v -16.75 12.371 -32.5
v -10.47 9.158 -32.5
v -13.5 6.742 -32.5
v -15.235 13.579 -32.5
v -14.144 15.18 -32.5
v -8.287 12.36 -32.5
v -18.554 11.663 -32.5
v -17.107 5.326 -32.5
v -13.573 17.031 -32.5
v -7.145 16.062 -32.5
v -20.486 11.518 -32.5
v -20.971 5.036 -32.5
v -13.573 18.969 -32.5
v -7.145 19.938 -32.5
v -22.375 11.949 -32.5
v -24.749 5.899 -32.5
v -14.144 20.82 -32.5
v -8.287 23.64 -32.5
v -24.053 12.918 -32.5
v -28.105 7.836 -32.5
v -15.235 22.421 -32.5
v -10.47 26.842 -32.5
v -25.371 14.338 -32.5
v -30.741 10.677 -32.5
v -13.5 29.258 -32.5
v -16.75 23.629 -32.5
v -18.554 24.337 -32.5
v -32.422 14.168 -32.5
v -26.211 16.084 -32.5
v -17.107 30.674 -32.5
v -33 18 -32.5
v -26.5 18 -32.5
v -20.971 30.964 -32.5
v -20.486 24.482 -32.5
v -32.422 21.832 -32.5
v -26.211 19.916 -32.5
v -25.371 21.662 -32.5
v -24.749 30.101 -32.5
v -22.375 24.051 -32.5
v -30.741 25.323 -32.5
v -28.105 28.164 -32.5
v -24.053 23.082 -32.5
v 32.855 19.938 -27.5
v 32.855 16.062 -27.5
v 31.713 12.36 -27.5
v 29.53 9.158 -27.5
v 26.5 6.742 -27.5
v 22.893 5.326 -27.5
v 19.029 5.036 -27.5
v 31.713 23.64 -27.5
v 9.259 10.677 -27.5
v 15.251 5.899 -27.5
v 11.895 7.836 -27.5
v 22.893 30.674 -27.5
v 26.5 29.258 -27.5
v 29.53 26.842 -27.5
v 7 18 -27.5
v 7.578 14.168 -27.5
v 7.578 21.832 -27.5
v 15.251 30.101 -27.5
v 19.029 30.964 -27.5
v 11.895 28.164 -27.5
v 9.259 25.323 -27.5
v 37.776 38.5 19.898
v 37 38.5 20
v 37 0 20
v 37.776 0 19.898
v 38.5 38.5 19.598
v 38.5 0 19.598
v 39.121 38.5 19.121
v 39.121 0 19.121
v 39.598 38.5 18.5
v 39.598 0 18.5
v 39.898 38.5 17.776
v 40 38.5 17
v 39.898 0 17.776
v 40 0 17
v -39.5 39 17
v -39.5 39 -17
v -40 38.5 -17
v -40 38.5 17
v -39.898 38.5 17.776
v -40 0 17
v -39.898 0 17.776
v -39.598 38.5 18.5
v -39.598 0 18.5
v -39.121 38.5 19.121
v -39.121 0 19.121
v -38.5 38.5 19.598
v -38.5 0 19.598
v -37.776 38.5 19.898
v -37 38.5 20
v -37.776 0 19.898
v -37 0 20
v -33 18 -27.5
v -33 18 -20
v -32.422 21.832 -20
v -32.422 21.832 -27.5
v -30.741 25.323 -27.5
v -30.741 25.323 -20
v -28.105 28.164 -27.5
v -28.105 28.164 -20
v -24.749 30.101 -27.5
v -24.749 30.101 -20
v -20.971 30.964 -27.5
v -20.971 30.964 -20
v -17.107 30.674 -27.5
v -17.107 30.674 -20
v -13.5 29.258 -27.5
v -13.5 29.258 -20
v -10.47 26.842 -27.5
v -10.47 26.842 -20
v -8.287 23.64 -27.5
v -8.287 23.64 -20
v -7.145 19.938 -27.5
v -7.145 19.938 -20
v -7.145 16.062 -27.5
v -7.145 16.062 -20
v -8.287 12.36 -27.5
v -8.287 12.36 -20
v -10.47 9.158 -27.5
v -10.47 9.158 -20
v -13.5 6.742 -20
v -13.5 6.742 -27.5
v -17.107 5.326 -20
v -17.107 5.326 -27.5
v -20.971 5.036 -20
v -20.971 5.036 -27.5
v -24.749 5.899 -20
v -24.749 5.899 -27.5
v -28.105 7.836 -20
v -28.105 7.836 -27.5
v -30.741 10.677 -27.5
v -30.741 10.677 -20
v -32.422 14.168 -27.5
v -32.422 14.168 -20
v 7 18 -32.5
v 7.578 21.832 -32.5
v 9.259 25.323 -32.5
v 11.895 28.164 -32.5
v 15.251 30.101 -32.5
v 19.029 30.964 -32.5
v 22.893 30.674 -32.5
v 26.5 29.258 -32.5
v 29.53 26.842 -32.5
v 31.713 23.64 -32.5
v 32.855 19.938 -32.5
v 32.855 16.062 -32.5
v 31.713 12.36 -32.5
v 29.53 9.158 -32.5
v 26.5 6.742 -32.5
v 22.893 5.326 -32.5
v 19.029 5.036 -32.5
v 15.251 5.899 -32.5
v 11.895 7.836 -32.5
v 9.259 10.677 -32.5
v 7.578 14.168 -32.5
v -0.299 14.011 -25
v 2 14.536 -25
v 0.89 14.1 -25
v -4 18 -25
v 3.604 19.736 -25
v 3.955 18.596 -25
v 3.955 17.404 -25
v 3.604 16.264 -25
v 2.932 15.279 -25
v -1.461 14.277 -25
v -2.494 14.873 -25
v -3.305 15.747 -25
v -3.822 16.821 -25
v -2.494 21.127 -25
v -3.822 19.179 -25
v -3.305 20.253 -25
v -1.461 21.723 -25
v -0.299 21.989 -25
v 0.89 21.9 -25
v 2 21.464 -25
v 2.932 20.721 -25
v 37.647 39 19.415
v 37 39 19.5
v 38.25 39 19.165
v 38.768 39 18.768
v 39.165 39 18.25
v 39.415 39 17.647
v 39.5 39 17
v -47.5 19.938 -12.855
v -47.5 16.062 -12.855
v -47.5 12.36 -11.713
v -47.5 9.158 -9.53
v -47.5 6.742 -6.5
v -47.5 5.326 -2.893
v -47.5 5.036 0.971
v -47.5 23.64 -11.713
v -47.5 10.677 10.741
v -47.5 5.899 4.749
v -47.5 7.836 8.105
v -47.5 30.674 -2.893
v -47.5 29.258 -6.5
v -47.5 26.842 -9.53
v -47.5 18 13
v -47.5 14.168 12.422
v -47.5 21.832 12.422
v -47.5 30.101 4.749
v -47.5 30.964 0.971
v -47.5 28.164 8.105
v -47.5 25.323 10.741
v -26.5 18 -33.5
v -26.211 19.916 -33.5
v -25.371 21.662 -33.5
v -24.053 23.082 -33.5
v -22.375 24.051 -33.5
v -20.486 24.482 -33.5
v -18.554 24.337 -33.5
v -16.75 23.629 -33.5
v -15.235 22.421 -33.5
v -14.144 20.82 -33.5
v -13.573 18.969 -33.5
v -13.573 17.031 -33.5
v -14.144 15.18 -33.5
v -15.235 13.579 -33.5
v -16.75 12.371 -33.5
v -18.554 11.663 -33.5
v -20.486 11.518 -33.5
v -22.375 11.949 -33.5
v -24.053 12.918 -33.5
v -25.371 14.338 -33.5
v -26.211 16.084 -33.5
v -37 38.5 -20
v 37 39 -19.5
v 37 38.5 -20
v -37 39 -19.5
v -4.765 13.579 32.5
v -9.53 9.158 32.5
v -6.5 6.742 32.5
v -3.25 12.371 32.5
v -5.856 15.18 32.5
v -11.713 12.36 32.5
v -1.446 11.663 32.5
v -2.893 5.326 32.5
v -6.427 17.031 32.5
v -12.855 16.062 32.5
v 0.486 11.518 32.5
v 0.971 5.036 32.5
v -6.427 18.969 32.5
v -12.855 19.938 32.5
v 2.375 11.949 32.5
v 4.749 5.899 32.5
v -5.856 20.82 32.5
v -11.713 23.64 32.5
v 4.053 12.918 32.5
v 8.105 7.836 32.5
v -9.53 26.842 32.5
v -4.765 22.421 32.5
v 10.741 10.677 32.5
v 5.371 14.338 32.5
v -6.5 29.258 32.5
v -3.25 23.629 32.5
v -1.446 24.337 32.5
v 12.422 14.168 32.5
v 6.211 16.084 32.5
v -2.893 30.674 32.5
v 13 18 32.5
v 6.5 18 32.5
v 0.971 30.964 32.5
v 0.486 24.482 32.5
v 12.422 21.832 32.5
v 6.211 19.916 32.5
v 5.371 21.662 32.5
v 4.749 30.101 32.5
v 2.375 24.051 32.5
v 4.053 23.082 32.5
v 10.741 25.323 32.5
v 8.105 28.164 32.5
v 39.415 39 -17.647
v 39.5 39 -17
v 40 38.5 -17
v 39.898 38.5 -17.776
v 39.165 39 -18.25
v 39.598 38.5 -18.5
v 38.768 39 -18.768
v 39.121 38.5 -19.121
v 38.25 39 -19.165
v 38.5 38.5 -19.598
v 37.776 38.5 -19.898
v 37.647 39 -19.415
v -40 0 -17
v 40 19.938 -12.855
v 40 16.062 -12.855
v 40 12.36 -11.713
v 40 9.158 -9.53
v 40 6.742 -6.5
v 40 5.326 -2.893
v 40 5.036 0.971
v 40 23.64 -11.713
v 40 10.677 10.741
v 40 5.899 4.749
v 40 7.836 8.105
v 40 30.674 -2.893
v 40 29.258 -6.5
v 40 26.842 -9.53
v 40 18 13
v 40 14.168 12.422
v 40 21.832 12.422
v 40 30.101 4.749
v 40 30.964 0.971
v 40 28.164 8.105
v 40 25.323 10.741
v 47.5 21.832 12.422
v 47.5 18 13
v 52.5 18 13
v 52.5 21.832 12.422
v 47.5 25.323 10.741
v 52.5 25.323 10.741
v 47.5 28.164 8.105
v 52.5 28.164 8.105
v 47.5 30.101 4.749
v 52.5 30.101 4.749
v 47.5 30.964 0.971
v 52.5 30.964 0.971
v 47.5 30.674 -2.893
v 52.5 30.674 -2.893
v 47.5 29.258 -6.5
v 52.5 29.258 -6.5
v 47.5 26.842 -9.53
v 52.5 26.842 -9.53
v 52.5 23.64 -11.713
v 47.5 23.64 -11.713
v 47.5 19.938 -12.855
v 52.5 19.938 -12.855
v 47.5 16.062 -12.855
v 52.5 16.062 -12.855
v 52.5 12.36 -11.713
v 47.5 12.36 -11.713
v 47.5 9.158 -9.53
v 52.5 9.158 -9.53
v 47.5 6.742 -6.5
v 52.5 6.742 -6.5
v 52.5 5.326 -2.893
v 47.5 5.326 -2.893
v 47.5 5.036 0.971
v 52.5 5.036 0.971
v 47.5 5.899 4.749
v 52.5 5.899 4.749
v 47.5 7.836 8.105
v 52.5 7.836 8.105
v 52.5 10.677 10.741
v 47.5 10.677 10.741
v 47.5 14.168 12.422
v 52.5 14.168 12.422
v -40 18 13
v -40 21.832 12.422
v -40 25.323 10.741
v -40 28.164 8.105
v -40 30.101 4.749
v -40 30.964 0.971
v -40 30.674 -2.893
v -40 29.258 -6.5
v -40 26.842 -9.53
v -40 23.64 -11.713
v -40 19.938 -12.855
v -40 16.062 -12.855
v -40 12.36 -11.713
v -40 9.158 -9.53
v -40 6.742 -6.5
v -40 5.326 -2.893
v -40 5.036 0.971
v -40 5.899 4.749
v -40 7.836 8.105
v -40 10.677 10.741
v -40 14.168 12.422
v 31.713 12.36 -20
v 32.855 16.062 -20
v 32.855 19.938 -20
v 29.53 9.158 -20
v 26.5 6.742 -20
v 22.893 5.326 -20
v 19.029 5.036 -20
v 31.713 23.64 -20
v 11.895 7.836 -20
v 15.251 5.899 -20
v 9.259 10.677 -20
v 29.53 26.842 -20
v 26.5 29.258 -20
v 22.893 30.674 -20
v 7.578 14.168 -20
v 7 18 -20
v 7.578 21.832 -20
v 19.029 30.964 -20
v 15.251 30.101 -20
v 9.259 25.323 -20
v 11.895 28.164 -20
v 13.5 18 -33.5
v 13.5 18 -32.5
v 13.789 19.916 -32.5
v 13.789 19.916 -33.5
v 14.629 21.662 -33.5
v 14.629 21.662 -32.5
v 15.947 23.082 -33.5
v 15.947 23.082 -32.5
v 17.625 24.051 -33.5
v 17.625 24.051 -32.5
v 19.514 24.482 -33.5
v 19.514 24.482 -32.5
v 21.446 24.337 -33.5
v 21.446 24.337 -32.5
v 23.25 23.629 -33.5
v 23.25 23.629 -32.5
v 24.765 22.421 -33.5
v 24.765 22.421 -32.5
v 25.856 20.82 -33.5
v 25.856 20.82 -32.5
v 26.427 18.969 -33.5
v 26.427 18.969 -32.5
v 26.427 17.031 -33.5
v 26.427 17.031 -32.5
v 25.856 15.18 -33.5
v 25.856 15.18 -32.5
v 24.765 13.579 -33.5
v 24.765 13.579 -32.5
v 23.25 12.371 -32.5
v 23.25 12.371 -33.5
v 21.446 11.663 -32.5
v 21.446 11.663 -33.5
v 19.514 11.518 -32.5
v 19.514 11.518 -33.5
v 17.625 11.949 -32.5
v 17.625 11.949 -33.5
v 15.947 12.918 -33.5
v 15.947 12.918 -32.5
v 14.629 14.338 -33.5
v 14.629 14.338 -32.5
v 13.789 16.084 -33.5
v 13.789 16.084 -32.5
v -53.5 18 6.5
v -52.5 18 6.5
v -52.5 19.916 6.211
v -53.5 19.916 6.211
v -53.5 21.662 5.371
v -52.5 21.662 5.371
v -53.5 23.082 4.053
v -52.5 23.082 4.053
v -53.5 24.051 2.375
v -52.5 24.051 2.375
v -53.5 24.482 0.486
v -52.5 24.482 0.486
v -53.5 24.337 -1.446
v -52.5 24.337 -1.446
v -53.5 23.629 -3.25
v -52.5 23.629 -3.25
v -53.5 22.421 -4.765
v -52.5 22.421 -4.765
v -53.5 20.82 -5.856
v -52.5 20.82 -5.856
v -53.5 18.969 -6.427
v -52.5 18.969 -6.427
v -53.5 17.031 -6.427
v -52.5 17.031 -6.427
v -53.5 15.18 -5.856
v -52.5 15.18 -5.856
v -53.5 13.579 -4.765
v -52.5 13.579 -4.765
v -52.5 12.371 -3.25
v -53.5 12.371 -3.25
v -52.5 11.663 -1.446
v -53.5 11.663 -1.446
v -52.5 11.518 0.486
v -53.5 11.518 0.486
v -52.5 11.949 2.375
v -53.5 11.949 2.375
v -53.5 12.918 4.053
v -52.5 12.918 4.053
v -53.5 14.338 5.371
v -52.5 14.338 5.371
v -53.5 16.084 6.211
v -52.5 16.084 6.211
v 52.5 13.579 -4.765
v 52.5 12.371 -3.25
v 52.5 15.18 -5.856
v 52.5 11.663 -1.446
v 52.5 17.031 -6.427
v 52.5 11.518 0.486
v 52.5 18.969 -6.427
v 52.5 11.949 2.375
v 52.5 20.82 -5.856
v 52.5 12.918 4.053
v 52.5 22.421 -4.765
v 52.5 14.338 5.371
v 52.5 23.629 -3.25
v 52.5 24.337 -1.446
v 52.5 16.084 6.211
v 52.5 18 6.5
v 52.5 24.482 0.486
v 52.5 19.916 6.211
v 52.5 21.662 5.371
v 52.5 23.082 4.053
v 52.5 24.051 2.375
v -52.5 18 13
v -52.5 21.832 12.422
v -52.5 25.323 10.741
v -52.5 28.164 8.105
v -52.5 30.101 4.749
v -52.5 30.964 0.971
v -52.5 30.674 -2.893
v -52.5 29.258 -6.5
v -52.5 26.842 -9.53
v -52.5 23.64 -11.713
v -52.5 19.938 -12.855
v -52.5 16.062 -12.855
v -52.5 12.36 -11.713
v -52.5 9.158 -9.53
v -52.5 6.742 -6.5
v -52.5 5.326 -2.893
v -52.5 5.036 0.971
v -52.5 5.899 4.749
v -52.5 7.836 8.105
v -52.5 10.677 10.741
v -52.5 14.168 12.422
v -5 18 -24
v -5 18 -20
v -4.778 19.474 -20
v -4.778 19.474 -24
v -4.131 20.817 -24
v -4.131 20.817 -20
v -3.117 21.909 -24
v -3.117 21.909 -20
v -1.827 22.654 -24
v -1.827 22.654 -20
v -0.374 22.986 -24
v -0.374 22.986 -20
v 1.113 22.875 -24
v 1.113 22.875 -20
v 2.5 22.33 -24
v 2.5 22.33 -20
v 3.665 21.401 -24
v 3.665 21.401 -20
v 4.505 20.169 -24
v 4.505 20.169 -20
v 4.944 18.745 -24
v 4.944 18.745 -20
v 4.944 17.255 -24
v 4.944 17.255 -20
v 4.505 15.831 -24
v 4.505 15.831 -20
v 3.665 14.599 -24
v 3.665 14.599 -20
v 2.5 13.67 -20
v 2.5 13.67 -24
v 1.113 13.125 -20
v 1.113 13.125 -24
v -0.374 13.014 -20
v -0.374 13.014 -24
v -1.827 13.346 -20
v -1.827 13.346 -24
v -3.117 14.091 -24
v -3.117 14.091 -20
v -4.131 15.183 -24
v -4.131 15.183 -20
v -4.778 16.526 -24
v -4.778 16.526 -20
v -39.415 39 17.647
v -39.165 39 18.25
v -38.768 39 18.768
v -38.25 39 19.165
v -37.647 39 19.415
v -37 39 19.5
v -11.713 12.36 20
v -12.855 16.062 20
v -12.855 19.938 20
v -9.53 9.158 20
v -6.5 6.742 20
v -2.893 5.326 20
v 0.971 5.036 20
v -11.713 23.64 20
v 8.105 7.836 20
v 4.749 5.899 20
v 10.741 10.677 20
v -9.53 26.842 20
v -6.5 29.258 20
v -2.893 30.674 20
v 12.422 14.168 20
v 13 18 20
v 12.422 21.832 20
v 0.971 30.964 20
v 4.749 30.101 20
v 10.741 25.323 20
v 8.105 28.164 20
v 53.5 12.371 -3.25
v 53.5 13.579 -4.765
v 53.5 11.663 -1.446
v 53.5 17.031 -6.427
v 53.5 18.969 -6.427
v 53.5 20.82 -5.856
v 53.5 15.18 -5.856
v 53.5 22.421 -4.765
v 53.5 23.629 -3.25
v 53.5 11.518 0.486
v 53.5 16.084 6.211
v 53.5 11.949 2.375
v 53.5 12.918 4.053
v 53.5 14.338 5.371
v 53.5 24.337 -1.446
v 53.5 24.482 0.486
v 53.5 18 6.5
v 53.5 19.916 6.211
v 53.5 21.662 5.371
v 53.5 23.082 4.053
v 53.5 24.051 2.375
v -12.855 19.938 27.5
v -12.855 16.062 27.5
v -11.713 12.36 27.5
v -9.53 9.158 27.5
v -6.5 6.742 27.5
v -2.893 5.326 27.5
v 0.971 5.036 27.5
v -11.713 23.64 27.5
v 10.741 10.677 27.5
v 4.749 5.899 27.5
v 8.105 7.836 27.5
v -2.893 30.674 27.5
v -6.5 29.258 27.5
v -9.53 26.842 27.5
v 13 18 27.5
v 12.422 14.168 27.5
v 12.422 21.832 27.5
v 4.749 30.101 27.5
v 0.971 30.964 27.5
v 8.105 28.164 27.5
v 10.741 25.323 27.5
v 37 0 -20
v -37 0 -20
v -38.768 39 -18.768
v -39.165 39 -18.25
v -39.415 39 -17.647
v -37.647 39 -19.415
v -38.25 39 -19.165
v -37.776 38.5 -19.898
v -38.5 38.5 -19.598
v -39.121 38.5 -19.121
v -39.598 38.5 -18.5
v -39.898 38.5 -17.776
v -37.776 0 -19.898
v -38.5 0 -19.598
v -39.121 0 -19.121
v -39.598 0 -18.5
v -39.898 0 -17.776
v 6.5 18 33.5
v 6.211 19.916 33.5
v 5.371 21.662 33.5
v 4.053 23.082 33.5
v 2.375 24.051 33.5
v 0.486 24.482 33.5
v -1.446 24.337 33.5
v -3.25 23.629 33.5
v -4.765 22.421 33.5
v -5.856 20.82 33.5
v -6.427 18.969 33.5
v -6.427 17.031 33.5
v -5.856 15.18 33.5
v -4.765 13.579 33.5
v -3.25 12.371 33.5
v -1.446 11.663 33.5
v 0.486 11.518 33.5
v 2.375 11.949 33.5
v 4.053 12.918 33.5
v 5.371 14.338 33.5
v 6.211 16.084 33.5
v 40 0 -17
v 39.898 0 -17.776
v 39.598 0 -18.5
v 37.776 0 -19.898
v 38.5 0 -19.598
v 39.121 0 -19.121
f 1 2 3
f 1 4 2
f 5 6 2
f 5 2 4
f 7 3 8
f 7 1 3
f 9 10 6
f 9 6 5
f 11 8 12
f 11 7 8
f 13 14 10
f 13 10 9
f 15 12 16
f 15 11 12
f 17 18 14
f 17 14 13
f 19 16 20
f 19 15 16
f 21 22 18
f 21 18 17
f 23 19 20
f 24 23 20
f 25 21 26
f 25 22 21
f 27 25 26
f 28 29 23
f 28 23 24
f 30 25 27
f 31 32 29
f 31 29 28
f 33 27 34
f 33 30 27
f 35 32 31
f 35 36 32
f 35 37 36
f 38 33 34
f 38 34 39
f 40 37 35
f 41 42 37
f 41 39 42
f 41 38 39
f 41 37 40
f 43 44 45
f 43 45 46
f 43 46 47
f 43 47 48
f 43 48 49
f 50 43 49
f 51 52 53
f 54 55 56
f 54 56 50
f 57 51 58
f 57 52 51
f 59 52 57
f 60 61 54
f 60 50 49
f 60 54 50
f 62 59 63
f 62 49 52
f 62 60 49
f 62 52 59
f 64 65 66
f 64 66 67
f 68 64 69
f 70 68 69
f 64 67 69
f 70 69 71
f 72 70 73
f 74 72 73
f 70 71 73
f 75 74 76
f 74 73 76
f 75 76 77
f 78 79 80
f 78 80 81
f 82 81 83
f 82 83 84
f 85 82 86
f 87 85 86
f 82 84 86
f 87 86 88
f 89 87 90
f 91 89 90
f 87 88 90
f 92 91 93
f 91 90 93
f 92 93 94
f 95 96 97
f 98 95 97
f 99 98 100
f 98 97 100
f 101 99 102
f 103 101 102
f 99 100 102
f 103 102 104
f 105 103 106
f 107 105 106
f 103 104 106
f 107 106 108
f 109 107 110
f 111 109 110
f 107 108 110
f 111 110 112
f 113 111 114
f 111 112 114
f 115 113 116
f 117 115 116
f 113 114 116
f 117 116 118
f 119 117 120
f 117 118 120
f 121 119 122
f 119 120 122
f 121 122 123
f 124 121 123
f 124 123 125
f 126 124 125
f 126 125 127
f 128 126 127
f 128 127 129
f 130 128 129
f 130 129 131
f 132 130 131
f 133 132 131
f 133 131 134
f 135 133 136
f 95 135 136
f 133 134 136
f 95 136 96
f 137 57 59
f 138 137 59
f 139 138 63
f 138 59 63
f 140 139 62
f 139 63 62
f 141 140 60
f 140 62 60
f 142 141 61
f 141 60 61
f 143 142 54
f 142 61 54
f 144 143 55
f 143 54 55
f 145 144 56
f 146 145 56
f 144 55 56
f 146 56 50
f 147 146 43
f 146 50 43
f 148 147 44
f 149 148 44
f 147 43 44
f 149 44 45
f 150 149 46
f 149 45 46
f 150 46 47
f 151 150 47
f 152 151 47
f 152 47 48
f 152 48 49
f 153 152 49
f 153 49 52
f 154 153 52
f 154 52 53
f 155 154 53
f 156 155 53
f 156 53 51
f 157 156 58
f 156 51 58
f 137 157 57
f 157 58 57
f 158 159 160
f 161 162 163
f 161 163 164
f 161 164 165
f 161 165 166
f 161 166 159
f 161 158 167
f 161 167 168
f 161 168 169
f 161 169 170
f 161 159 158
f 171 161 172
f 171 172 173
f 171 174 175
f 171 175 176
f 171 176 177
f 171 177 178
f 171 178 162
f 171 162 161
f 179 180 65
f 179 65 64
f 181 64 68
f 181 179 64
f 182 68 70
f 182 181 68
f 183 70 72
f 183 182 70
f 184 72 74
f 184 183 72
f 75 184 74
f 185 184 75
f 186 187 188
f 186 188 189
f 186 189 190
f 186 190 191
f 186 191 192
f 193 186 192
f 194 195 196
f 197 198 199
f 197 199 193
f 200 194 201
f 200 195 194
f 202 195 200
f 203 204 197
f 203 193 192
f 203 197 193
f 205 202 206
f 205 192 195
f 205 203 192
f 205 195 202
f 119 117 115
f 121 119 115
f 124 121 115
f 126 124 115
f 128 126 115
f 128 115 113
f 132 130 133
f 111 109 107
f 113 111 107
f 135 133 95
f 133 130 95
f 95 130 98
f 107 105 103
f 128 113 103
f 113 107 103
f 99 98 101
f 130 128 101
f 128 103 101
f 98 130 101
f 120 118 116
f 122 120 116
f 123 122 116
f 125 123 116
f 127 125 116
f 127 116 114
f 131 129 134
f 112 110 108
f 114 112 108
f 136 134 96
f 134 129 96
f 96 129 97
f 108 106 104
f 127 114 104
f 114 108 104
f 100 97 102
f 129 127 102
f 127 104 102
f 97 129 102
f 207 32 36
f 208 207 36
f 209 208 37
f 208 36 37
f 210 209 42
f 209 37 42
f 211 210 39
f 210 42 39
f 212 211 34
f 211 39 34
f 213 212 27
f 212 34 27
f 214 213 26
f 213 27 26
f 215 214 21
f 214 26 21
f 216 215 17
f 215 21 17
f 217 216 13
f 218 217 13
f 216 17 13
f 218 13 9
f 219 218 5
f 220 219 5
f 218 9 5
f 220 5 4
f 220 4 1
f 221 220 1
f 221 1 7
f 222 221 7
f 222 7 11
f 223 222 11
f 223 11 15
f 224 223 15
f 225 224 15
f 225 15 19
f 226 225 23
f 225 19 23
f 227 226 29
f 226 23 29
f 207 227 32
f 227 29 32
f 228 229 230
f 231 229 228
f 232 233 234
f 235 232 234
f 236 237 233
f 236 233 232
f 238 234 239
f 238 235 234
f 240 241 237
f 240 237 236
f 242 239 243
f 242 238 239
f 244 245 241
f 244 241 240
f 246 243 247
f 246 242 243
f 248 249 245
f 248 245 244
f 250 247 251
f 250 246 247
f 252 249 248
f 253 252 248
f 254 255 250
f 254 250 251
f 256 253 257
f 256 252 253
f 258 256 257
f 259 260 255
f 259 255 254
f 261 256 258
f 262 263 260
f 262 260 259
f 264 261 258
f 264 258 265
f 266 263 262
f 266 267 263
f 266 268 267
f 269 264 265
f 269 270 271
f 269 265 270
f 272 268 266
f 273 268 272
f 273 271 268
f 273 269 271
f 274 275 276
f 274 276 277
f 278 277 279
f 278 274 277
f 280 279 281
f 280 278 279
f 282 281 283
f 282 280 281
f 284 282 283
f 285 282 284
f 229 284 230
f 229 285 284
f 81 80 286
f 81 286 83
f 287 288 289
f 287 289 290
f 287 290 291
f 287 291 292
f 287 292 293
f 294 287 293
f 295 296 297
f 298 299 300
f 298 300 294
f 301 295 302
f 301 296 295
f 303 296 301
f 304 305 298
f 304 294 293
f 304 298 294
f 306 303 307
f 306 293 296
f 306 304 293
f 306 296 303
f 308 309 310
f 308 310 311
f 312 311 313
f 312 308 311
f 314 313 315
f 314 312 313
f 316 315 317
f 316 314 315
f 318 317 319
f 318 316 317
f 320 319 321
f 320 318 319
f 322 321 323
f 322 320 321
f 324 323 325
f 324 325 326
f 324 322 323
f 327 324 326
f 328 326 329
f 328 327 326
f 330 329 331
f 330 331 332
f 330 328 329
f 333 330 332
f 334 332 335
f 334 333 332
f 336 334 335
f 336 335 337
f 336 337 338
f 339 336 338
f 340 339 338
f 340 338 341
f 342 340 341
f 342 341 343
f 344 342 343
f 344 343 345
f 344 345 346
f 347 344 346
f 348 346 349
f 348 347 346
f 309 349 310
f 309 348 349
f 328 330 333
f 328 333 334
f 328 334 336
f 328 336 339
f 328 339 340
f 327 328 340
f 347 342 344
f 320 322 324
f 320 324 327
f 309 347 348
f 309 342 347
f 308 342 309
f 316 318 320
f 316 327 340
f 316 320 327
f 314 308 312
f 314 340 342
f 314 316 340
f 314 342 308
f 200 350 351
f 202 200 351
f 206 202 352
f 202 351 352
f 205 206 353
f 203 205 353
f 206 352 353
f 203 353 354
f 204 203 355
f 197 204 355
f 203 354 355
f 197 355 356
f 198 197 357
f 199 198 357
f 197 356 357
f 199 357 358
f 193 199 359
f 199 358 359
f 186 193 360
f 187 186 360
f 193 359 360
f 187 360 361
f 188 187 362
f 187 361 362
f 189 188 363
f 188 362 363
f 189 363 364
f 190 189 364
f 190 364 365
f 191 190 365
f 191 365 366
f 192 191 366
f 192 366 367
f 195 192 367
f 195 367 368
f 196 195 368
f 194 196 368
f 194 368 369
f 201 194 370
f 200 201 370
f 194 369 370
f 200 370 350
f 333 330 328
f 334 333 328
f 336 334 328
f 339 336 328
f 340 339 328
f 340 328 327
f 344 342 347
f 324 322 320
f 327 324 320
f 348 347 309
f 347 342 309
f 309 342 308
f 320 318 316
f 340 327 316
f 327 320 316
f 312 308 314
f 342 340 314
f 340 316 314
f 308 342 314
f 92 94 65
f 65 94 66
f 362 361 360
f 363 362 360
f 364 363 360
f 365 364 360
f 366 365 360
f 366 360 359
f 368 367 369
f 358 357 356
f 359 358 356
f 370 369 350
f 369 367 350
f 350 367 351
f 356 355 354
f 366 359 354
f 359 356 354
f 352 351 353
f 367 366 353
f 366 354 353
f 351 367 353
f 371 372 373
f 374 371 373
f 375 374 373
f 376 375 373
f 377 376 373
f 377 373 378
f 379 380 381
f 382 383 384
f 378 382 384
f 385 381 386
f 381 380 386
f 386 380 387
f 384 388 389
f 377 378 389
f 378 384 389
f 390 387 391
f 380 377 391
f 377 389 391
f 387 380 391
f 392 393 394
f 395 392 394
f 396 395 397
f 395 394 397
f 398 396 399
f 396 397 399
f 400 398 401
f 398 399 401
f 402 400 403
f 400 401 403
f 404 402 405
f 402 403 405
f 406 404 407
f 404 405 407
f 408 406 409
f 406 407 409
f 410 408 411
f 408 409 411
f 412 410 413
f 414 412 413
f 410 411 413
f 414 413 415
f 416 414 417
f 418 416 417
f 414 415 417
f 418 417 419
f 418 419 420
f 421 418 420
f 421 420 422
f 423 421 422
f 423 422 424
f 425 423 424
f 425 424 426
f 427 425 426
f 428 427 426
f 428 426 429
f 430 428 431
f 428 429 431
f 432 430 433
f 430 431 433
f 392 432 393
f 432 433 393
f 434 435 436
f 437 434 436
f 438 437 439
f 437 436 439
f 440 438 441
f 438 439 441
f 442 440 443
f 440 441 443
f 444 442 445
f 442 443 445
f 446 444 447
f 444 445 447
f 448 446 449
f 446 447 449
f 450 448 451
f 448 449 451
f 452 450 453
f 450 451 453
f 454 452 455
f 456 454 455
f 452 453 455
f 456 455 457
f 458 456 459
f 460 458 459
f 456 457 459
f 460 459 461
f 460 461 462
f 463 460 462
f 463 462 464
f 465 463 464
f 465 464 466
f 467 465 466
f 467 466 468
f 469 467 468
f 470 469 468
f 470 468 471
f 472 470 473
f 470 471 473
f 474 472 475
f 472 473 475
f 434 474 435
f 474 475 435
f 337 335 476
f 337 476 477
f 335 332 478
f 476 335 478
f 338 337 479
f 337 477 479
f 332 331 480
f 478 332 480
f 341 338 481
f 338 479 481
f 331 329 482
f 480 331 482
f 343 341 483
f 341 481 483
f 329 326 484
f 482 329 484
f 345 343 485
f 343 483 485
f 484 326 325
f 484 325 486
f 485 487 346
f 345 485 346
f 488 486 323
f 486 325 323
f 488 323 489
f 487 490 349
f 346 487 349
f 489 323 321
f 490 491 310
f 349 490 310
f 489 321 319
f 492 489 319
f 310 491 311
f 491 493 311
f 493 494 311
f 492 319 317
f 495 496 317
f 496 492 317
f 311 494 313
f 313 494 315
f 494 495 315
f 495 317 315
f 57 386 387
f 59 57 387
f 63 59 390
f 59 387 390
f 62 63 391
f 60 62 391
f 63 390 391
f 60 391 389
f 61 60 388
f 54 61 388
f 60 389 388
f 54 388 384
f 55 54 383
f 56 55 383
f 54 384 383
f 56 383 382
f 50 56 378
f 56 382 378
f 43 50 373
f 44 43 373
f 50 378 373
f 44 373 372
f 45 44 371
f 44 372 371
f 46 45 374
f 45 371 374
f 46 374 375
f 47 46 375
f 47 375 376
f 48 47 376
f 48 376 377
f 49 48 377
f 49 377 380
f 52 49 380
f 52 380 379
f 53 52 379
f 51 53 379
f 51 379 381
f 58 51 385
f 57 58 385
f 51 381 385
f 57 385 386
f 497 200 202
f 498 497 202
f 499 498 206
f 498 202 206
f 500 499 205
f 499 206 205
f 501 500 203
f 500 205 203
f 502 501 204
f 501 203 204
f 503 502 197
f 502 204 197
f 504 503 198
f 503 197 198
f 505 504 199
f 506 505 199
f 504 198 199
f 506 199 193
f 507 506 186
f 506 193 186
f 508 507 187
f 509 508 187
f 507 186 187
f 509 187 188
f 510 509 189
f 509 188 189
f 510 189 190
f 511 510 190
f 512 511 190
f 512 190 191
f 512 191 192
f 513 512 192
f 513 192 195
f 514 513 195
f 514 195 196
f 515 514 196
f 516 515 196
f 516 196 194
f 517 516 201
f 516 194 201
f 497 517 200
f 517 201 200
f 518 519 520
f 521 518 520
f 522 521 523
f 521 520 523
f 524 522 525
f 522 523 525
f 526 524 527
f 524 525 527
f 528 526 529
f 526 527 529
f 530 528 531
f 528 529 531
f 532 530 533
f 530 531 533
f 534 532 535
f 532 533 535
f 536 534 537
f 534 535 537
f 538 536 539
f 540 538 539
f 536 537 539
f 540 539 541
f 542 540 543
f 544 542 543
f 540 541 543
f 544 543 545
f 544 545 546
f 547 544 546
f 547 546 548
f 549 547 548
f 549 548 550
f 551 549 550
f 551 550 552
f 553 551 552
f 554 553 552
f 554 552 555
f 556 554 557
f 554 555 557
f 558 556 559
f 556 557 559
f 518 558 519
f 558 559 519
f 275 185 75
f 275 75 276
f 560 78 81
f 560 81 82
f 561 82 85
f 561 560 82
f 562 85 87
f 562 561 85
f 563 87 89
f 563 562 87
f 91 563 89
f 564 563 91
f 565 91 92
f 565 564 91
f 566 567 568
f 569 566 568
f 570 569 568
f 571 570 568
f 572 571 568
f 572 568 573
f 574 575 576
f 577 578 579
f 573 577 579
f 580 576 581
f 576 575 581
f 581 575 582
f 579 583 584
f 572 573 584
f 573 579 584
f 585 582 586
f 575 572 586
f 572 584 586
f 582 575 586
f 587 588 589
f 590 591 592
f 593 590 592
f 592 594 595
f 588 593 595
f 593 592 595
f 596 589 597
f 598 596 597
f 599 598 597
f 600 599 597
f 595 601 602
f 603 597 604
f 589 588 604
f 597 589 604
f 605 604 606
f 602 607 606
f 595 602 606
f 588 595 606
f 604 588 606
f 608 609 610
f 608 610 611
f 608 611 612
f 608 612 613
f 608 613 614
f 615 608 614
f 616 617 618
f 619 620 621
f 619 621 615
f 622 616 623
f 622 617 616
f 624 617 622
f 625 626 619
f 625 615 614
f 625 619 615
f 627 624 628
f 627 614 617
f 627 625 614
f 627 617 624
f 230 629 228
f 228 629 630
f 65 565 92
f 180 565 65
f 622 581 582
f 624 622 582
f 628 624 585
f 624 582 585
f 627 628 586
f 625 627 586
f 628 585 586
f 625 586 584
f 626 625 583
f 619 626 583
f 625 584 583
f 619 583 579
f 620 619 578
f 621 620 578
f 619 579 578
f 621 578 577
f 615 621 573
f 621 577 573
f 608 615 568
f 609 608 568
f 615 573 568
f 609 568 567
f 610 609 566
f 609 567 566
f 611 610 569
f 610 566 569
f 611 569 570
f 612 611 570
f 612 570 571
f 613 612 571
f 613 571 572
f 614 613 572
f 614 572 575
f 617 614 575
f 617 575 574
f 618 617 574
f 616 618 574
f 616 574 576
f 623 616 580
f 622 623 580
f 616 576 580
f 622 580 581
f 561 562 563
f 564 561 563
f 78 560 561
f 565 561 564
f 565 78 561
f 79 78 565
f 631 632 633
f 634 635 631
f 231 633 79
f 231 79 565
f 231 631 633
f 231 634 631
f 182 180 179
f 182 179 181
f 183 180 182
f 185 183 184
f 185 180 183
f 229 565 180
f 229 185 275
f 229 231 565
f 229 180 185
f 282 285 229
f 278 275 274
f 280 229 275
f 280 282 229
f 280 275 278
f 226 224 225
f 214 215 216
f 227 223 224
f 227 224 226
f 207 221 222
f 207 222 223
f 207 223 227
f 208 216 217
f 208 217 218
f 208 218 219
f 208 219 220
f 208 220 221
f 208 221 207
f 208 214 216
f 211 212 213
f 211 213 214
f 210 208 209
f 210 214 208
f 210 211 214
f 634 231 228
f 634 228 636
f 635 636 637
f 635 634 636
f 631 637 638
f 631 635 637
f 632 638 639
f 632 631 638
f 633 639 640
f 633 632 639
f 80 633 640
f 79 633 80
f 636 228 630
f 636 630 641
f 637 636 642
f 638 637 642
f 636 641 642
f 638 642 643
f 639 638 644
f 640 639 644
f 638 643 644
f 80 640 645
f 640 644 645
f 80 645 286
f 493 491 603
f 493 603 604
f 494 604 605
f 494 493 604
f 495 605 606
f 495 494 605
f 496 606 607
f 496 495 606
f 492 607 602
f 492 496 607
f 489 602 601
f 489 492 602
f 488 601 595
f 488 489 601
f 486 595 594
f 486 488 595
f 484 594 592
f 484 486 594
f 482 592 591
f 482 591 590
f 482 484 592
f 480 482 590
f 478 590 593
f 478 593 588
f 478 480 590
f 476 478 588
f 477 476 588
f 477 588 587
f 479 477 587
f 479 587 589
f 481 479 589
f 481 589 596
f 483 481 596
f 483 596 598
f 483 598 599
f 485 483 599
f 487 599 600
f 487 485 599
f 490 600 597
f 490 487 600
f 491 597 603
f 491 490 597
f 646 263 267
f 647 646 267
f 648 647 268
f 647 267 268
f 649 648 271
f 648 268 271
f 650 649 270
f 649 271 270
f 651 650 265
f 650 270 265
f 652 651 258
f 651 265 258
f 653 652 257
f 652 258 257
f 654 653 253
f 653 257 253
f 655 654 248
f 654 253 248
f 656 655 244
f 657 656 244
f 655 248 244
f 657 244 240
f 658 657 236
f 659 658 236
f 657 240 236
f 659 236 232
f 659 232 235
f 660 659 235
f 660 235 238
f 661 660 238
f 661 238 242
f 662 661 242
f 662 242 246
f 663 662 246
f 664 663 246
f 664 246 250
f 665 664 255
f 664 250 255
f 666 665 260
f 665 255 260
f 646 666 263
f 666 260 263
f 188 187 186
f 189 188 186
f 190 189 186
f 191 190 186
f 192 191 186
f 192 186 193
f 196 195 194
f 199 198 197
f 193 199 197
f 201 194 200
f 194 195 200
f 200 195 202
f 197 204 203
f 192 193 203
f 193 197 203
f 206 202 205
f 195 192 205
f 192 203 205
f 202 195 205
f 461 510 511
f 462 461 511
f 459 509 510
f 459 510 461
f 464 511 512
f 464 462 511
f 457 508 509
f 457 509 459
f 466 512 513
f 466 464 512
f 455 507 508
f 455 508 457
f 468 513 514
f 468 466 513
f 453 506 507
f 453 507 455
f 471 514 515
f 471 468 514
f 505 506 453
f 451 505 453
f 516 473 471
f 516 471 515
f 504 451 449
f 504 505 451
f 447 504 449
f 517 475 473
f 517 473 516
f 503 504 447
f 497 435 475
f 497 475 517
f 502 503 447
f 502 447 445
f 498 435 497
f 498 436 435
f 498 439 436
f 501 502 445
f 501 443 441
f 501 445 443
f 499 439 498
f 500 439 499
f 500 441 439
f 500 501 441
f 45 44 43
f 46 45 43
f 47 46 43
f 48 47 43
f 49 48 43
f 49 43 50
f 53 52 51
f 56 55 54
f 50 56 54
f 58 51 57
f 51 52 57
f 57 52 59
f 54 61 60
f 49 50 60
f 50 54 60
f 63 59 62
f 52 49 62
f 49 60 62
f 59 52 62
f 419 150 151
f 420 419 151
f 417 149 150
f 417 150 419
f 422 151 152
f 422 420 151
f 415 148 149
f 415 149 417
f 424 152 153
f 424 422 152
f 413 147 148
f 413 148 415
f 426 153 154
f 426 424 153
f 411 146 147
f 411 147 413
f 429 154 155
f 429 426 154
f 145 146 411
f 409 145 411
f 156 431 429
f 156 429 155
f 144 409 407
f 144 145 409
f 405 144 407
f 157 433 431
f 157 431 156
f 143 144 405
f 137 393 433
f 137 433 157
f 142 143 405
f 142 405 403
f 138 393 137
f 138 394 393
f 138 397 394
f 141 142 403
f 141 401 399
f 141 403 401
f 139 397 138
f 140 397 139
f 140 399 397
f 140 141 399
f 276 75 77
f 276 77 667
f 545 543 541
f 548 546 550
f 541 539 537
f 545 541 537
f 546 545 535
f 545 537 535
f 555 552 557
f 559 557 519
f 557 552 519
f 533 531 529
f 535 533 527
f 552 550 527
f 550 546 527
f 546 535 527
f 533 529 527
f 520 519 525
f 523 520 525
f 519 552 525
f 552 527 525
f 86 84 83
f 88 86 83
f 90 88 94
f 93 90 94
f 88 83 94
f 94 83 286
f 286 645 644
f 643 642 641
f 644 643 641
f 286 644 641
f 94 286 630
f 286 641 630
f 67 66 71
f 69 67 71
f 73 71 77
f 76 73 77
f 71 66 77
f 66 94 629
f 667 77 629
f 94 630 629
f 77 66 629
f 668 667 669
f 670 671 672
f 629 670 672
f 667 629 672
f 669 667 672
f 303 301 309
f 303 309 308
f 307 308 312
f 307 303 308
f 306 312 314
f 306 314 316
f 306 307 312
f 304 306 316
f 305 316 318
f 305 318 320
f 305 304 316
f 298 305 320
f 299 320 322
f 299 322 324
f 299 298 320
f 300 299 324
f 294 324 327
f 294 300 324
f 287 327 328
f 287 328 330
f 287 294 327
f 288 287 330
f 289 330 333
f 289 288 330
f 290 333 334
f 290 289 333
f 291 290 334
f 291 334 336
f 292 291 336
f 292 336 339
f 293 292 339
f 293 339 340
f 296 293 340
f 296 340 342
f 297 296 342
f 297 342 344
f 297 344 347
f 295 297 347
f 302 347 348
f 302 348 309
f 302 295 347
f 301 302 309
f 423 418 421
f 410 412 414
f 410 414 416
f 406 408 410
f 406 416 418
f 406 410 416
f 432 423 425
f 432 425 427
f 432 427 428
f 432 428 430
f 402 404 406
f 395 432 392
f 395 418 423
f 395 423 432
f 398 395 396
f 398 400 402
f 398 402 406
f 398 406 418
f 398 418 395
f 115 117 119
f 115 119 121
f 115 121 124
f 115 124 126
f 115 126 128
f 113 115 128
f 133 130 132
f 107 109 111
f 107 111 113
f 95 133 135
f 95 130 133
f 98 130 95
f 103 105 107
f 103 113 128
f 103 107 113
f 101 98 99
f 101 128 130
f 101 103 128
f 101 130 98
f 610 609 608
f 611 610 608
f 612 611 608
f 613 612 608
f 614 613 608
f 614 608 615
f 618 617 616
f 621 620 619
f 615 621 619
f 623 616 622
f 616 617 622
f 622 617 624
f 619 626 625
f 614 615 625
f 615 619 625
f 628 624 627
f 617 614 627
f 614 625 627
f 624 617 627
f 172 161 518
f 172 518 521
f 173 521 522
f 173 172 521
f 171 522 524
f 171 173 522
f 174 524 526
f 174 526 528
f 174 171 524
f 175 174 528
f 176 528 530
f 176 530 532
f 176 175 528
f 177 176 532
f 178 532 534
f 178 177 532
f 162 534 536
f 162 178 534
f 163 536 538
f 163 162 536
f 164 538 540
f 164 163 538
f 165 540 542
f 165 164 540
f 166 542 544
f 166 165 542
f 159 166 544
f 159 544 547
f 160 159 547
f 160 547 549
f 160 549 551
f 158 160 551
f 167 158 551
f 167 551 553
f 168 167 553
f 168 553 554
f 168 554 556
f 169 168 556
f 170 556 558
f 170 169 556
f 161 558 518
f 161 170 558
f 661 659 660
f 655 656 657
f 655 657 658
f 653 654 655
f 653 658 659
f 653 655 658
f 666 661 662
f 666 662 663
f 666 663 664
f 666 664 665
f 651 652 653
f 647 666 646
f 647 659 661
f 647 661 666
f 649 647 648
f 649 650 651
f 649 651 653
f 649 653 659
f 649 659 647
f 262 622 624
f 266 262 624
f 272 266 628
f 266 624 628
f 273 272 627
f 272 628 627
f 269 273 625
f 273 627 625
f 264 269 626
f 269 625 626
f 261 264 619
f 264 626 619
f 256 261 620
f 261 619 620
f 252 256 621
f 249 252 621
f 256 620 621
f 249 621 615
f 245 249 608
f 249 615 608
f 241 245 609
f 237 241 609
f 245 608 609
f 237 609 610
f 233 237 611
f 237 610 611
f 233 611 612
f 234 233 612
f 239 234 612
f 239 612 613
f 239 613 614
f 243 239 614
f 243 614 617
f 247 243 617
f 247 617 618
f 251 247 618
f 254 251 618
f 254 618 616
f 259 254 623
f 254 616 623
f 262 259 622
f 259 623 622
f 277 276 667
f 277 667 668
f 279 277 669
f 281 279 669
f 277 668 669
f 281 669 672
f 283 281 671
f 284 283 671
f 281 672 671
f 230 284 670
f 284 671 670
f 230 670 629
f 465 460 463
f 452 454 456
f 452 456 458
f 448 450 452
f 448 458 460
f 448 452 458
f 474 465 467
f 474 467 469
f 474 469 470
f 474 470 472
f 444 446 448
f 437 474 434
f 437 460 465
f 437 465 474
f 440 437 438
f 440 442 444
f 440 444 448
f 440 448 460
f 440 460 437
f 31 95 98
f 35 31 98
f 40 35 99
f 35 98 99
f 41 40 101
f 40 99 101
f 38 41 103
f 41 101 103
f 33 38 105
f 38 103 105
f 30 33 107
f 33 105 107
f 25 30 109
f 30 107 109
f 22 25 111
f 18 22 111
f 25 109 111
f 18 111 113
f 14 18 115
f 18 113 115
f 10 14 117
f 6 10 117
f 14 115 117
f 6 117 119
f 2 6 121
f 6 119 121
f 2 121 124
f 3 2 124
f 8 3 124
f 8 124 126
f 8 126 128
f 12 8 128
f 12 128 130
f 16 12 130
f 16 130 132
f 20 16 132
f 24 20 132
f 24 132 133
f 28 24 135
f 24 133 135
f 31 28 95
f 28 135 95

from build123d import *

# Parameters (mm, degrees)
BOSS_EXTRUDE1_DEPTH  = 39
CHAMFER1_SIZE        = 0.5
SKETCH2_R            = 13
BOSS_EXTRUDE2_DEPTH  = 7.5
SKETCH3_R            = 13
BOSS_EXTRUDE3_DEPTH  = 5
SKETCH4_R            = 6.5
BOSS_EXTRUDE4_DEPTH  = 1
SKETCH11_R           = 13
BOSS_EXTRUDE9_DEPTH  = 7.5
SKETCH13_R           = 13
BOSS_EXTRUDE10_DEPTH = 5
SKETCH15_R           = 6.5
BOSS_EXTRUDE11_DEPTH = 1
SKETCH25_R           = 13
BOSS_EXTRUDE16_DEPTH = 7.5
SKETCH27_R           = 13
BOSS_EXTRUDE17_DEPTH = 5
SKETCH29_R           = 6.5
BOSS_EXTRUDE18_DEPTH = 1
SKETCH39_R           = 13
BOSS_EXTRUDE23_DEPTH = 7.5
SKETCH41_R           = 13
BOSS_EXTRUDE24_DEPTH = 5
SKETCH43_R           = 6.5
BOSS_EXTRUDE25_DEPTH = 1
SKETCH59_R           = 5
BOSS_EXTRUDE30_DEPTH = 5
CHAMFER5_SIZE        = 1


with BuildPart() as part:
    # Sketch1 → Boss-Extrude1 (new body)
    with BuildSketch(Plane(origin=(0, 0, 0), x_dir=(1, 0, 0), z_dir=(0, 1, 0))):
        with BuildLine():
            Line((-37, -20), (37, -20))
            ThreePointArc((37, -20), (39.121320344, -19.121320344), (40, -17))
            Line((40, -17), (40, 17))
            ThreePointArc((40, 17), (39.121320344, 19.121320344), (37, 20))
            Line((37, 20), (-37, 20))
            ThreePointArc((-37, 20), (-39.121320344, 19.121320344), (-40, 17))
            Line((-40, 17), (-40, -17))
            ThreePointArc((-40, -17), (-39.121320344, -19.121320344), (-37, -20))
        make_face()
    extrude(amount=BOSS_EXTRUDE1_DEPTH)

    # Chamfer1
    chamfer1_edges = [part.edges().sort_by_distance(p)[0] for p in [
        (39.121320344, 39, -19.121320344),
        (0, 39, -20),
        (-39.121320344, 39, -19.121320344),
        (-40, 39, 0),
        (-39.121320344, 39, 19.121320344),
        (0, 39, 20),
        (39.121320344, 39, 19.121320344),
        (40, 39, 0),
    ]]
    chamfer(chamfer1_edges, length=CHAMFER1_SIZE)


with BuildPart() as body_2:
    # Sketch2 → Boss-Extrude2 (new body)
    with BuildSketch(Plane.ZY.offset(40)):
        with Locations((0, 18)):
            Circle(SKETCH2_R)
    extrude(amount=BOSS_EXTRUDE2_DEPTH)


with BuildPart() as body_3:
    # Sketch3 → Boss-Extrude3 (new body)
    with BuildSketch(Plane.ZY.offset(47.5)):
        with Locations((0, 18)):
            Circle(SKETCH3_R)
    extrude(amount=BOSS_EXTRUDE3_DEPTH)

    # Sketch4 → Boss-Extrude4 (add)
    with BuildSketch(Plane.ZY.offset(52.5)):
        with Locations((0, 18)):
            Circle(SKETCH4_R)
    extrude(amount=BOSS_EXTRUDE4_DEPTH)


with BuildPart() as body_4:
    # Mirror2: mirrored copy
    add(body_3.part.mirror(Plane(origin=(0, 0, 0), x_dir=(0, 0, 1), z_dir=(1, 0, 0))))


with BuildPart() as body_5:
    # Mirror2 2: mirrored copy
    add(body_2.part.mirror(Plane(origin=(0, 0, 0), x_dir=(0, 0, 1), z_dir=(1, 0, 0))))


with BuildPart() as body_6:
    # Sketch11 → Boss-Extrude9 (new body)
    with BuildSketch(Plane(origin=(-15.219675371, -9.618672718, 20), x_dir=(1, 0, 0), z_dir=(0, 0, 1))):
        with Locations((15.219675371, 27.618672718)):
            Circle(SKETCH11_R)
    extrude(amount=BOSS_EXTRUDE9_DEPTH)


with BuildPart() as body_7:
    # Sketch13 → Boss-Extrude10 (new body)
    with BuildSketch(Plane(origin=(-15.219675371, -9.618672718, 27.5), x_dir=(1, 0, 0), z_dir=(0, 0, 1))):
        with Locations((15.219675371, 27.618672718)):
            Circle(SKETCH13_R)
    extrude(amount=BOSS_EXTRUDE10_DEPTH)

    # Sketch15 → Boss-Extrude11 (add)
    with BuildSketch(Plane(origin=(-15.219675371, -9.618672718, 32.5), x_dir=(1, 0, 0), z_dir=(0, 0, 1))):
        with Locations((15.219675371, 27.618672718)):
            Circle(SKETCH15_R)
    extrude(amount=BOSS_EXTRUDE11_DEPTH)


with BuildPart() as body_8:
    # Sketch25 → Boss-Extrude16 (new body)
    with BuildSketch(Plane(origin=(-4.430271092, 5.776930412, -20), x_dir=(-1, 0, 0), z_dir=(0, 0, -1))):
        with Locations((15.569728908, 12.223069588)):
            Circle(SKETCH25_R)
    extrude(amount=BOSS_EXTRUDE16_DEPTH)


with BuildPart() as body_9:
    # Sketch27 → Boss-Extrude17 (new body)
    with BuildSketch(Plane(origin=(-4.430271092, 5.776930412, -27.5), x_dir=(-1, 0, 0), z_dir=(0, 0, -1))):
        with Locations((15.569728908, 12.223069588)):
            Circle(SKETCH27_R)
    extrude(amount=BOSS_EXTRUDE17_DEPTH)

    # Sketch29 → Boss-Extrude18 (add)
    with BuildSketch(Plane(origin=(-4.430271092, 5.776930412, -32.5), x_dir=(-1, 0, 0), z_dir=(0, 0, -1))):
        with Locations((15.569728908, 12.223069588)):
            Circle(SKETCH29_R)
    extrude(amount=BOSS_EXTRUDE18_DEPTH)


with BuildPart() as body_10:
    # Sketch39 → Boss-Extrude23 (new body)
    with BuildSketch(Plane(origin=(-17.91556365, -3.403900427, -20), x_dir=(-1, 0, 0), z_dir=(0, 0, -1))):
        with Locations((-37.91556365, 21.403900427)):
            Circle(SKETCH39_R)
    extrude(amount=BOSS_EXTRUDE23_DEPTH)


with BuildPart() as body_11:
    # Sketch41 → Boss-Extrude24 (new body)
    with BuildSketch(Plane(origin=(-17.91556365, -3.403900427, -27.5), x_dir=(-1, 0, 0), z_dir=(0, 0, -1))):
        with Locations((-37.91556365, 21.403900427)):
            Circle(SKETCH41_R)
    extrude(amount=BOSS_EXTRUDE24_DEPTH)

    # Sketch43 → Boss-Extrude25 (add)
    with BuildSketch(Plane(origin=(-17.91556365, -3.403900427, -32.5), x_dir=(-1, 0, 0), z_dir=(0, 0, -1))):
        with Locations((-37.91556365, 21.403900427)):
            Circle(SKETCH43_R)
    extrude(amount=BOSS_EXTRUDE25_DEPTH)


with BuildPart() as body_12:
    # Sketch59 → Boss-Extrude30 (new body)
    with BuildSketch(Plane(origin=(0, 0, -20), x_dir=(-1, 0, 0), z_dir=(0, 0, -1))):
        with Locations((0, 18)):
            Circle(SKETCH59_R)
    extrude(amount=BOSS_EXTRUDE30_DEPTH)

    # Chamfer5
    chamfer5_edges = [body_12.edges().sort_by_distance(p)[0] for p in [
        (5, 18, -25),
    ]]
    chamfer(chamfer5_edges, length=CHAMFER5_SIZE)


solid = Compound([part.part, body_2.part, body_3.part, body_4.part, body_5.part, body_6.part, body_7.part, body_8.part, body_9.part, body_10.part, body_11.part, body_12.part])
